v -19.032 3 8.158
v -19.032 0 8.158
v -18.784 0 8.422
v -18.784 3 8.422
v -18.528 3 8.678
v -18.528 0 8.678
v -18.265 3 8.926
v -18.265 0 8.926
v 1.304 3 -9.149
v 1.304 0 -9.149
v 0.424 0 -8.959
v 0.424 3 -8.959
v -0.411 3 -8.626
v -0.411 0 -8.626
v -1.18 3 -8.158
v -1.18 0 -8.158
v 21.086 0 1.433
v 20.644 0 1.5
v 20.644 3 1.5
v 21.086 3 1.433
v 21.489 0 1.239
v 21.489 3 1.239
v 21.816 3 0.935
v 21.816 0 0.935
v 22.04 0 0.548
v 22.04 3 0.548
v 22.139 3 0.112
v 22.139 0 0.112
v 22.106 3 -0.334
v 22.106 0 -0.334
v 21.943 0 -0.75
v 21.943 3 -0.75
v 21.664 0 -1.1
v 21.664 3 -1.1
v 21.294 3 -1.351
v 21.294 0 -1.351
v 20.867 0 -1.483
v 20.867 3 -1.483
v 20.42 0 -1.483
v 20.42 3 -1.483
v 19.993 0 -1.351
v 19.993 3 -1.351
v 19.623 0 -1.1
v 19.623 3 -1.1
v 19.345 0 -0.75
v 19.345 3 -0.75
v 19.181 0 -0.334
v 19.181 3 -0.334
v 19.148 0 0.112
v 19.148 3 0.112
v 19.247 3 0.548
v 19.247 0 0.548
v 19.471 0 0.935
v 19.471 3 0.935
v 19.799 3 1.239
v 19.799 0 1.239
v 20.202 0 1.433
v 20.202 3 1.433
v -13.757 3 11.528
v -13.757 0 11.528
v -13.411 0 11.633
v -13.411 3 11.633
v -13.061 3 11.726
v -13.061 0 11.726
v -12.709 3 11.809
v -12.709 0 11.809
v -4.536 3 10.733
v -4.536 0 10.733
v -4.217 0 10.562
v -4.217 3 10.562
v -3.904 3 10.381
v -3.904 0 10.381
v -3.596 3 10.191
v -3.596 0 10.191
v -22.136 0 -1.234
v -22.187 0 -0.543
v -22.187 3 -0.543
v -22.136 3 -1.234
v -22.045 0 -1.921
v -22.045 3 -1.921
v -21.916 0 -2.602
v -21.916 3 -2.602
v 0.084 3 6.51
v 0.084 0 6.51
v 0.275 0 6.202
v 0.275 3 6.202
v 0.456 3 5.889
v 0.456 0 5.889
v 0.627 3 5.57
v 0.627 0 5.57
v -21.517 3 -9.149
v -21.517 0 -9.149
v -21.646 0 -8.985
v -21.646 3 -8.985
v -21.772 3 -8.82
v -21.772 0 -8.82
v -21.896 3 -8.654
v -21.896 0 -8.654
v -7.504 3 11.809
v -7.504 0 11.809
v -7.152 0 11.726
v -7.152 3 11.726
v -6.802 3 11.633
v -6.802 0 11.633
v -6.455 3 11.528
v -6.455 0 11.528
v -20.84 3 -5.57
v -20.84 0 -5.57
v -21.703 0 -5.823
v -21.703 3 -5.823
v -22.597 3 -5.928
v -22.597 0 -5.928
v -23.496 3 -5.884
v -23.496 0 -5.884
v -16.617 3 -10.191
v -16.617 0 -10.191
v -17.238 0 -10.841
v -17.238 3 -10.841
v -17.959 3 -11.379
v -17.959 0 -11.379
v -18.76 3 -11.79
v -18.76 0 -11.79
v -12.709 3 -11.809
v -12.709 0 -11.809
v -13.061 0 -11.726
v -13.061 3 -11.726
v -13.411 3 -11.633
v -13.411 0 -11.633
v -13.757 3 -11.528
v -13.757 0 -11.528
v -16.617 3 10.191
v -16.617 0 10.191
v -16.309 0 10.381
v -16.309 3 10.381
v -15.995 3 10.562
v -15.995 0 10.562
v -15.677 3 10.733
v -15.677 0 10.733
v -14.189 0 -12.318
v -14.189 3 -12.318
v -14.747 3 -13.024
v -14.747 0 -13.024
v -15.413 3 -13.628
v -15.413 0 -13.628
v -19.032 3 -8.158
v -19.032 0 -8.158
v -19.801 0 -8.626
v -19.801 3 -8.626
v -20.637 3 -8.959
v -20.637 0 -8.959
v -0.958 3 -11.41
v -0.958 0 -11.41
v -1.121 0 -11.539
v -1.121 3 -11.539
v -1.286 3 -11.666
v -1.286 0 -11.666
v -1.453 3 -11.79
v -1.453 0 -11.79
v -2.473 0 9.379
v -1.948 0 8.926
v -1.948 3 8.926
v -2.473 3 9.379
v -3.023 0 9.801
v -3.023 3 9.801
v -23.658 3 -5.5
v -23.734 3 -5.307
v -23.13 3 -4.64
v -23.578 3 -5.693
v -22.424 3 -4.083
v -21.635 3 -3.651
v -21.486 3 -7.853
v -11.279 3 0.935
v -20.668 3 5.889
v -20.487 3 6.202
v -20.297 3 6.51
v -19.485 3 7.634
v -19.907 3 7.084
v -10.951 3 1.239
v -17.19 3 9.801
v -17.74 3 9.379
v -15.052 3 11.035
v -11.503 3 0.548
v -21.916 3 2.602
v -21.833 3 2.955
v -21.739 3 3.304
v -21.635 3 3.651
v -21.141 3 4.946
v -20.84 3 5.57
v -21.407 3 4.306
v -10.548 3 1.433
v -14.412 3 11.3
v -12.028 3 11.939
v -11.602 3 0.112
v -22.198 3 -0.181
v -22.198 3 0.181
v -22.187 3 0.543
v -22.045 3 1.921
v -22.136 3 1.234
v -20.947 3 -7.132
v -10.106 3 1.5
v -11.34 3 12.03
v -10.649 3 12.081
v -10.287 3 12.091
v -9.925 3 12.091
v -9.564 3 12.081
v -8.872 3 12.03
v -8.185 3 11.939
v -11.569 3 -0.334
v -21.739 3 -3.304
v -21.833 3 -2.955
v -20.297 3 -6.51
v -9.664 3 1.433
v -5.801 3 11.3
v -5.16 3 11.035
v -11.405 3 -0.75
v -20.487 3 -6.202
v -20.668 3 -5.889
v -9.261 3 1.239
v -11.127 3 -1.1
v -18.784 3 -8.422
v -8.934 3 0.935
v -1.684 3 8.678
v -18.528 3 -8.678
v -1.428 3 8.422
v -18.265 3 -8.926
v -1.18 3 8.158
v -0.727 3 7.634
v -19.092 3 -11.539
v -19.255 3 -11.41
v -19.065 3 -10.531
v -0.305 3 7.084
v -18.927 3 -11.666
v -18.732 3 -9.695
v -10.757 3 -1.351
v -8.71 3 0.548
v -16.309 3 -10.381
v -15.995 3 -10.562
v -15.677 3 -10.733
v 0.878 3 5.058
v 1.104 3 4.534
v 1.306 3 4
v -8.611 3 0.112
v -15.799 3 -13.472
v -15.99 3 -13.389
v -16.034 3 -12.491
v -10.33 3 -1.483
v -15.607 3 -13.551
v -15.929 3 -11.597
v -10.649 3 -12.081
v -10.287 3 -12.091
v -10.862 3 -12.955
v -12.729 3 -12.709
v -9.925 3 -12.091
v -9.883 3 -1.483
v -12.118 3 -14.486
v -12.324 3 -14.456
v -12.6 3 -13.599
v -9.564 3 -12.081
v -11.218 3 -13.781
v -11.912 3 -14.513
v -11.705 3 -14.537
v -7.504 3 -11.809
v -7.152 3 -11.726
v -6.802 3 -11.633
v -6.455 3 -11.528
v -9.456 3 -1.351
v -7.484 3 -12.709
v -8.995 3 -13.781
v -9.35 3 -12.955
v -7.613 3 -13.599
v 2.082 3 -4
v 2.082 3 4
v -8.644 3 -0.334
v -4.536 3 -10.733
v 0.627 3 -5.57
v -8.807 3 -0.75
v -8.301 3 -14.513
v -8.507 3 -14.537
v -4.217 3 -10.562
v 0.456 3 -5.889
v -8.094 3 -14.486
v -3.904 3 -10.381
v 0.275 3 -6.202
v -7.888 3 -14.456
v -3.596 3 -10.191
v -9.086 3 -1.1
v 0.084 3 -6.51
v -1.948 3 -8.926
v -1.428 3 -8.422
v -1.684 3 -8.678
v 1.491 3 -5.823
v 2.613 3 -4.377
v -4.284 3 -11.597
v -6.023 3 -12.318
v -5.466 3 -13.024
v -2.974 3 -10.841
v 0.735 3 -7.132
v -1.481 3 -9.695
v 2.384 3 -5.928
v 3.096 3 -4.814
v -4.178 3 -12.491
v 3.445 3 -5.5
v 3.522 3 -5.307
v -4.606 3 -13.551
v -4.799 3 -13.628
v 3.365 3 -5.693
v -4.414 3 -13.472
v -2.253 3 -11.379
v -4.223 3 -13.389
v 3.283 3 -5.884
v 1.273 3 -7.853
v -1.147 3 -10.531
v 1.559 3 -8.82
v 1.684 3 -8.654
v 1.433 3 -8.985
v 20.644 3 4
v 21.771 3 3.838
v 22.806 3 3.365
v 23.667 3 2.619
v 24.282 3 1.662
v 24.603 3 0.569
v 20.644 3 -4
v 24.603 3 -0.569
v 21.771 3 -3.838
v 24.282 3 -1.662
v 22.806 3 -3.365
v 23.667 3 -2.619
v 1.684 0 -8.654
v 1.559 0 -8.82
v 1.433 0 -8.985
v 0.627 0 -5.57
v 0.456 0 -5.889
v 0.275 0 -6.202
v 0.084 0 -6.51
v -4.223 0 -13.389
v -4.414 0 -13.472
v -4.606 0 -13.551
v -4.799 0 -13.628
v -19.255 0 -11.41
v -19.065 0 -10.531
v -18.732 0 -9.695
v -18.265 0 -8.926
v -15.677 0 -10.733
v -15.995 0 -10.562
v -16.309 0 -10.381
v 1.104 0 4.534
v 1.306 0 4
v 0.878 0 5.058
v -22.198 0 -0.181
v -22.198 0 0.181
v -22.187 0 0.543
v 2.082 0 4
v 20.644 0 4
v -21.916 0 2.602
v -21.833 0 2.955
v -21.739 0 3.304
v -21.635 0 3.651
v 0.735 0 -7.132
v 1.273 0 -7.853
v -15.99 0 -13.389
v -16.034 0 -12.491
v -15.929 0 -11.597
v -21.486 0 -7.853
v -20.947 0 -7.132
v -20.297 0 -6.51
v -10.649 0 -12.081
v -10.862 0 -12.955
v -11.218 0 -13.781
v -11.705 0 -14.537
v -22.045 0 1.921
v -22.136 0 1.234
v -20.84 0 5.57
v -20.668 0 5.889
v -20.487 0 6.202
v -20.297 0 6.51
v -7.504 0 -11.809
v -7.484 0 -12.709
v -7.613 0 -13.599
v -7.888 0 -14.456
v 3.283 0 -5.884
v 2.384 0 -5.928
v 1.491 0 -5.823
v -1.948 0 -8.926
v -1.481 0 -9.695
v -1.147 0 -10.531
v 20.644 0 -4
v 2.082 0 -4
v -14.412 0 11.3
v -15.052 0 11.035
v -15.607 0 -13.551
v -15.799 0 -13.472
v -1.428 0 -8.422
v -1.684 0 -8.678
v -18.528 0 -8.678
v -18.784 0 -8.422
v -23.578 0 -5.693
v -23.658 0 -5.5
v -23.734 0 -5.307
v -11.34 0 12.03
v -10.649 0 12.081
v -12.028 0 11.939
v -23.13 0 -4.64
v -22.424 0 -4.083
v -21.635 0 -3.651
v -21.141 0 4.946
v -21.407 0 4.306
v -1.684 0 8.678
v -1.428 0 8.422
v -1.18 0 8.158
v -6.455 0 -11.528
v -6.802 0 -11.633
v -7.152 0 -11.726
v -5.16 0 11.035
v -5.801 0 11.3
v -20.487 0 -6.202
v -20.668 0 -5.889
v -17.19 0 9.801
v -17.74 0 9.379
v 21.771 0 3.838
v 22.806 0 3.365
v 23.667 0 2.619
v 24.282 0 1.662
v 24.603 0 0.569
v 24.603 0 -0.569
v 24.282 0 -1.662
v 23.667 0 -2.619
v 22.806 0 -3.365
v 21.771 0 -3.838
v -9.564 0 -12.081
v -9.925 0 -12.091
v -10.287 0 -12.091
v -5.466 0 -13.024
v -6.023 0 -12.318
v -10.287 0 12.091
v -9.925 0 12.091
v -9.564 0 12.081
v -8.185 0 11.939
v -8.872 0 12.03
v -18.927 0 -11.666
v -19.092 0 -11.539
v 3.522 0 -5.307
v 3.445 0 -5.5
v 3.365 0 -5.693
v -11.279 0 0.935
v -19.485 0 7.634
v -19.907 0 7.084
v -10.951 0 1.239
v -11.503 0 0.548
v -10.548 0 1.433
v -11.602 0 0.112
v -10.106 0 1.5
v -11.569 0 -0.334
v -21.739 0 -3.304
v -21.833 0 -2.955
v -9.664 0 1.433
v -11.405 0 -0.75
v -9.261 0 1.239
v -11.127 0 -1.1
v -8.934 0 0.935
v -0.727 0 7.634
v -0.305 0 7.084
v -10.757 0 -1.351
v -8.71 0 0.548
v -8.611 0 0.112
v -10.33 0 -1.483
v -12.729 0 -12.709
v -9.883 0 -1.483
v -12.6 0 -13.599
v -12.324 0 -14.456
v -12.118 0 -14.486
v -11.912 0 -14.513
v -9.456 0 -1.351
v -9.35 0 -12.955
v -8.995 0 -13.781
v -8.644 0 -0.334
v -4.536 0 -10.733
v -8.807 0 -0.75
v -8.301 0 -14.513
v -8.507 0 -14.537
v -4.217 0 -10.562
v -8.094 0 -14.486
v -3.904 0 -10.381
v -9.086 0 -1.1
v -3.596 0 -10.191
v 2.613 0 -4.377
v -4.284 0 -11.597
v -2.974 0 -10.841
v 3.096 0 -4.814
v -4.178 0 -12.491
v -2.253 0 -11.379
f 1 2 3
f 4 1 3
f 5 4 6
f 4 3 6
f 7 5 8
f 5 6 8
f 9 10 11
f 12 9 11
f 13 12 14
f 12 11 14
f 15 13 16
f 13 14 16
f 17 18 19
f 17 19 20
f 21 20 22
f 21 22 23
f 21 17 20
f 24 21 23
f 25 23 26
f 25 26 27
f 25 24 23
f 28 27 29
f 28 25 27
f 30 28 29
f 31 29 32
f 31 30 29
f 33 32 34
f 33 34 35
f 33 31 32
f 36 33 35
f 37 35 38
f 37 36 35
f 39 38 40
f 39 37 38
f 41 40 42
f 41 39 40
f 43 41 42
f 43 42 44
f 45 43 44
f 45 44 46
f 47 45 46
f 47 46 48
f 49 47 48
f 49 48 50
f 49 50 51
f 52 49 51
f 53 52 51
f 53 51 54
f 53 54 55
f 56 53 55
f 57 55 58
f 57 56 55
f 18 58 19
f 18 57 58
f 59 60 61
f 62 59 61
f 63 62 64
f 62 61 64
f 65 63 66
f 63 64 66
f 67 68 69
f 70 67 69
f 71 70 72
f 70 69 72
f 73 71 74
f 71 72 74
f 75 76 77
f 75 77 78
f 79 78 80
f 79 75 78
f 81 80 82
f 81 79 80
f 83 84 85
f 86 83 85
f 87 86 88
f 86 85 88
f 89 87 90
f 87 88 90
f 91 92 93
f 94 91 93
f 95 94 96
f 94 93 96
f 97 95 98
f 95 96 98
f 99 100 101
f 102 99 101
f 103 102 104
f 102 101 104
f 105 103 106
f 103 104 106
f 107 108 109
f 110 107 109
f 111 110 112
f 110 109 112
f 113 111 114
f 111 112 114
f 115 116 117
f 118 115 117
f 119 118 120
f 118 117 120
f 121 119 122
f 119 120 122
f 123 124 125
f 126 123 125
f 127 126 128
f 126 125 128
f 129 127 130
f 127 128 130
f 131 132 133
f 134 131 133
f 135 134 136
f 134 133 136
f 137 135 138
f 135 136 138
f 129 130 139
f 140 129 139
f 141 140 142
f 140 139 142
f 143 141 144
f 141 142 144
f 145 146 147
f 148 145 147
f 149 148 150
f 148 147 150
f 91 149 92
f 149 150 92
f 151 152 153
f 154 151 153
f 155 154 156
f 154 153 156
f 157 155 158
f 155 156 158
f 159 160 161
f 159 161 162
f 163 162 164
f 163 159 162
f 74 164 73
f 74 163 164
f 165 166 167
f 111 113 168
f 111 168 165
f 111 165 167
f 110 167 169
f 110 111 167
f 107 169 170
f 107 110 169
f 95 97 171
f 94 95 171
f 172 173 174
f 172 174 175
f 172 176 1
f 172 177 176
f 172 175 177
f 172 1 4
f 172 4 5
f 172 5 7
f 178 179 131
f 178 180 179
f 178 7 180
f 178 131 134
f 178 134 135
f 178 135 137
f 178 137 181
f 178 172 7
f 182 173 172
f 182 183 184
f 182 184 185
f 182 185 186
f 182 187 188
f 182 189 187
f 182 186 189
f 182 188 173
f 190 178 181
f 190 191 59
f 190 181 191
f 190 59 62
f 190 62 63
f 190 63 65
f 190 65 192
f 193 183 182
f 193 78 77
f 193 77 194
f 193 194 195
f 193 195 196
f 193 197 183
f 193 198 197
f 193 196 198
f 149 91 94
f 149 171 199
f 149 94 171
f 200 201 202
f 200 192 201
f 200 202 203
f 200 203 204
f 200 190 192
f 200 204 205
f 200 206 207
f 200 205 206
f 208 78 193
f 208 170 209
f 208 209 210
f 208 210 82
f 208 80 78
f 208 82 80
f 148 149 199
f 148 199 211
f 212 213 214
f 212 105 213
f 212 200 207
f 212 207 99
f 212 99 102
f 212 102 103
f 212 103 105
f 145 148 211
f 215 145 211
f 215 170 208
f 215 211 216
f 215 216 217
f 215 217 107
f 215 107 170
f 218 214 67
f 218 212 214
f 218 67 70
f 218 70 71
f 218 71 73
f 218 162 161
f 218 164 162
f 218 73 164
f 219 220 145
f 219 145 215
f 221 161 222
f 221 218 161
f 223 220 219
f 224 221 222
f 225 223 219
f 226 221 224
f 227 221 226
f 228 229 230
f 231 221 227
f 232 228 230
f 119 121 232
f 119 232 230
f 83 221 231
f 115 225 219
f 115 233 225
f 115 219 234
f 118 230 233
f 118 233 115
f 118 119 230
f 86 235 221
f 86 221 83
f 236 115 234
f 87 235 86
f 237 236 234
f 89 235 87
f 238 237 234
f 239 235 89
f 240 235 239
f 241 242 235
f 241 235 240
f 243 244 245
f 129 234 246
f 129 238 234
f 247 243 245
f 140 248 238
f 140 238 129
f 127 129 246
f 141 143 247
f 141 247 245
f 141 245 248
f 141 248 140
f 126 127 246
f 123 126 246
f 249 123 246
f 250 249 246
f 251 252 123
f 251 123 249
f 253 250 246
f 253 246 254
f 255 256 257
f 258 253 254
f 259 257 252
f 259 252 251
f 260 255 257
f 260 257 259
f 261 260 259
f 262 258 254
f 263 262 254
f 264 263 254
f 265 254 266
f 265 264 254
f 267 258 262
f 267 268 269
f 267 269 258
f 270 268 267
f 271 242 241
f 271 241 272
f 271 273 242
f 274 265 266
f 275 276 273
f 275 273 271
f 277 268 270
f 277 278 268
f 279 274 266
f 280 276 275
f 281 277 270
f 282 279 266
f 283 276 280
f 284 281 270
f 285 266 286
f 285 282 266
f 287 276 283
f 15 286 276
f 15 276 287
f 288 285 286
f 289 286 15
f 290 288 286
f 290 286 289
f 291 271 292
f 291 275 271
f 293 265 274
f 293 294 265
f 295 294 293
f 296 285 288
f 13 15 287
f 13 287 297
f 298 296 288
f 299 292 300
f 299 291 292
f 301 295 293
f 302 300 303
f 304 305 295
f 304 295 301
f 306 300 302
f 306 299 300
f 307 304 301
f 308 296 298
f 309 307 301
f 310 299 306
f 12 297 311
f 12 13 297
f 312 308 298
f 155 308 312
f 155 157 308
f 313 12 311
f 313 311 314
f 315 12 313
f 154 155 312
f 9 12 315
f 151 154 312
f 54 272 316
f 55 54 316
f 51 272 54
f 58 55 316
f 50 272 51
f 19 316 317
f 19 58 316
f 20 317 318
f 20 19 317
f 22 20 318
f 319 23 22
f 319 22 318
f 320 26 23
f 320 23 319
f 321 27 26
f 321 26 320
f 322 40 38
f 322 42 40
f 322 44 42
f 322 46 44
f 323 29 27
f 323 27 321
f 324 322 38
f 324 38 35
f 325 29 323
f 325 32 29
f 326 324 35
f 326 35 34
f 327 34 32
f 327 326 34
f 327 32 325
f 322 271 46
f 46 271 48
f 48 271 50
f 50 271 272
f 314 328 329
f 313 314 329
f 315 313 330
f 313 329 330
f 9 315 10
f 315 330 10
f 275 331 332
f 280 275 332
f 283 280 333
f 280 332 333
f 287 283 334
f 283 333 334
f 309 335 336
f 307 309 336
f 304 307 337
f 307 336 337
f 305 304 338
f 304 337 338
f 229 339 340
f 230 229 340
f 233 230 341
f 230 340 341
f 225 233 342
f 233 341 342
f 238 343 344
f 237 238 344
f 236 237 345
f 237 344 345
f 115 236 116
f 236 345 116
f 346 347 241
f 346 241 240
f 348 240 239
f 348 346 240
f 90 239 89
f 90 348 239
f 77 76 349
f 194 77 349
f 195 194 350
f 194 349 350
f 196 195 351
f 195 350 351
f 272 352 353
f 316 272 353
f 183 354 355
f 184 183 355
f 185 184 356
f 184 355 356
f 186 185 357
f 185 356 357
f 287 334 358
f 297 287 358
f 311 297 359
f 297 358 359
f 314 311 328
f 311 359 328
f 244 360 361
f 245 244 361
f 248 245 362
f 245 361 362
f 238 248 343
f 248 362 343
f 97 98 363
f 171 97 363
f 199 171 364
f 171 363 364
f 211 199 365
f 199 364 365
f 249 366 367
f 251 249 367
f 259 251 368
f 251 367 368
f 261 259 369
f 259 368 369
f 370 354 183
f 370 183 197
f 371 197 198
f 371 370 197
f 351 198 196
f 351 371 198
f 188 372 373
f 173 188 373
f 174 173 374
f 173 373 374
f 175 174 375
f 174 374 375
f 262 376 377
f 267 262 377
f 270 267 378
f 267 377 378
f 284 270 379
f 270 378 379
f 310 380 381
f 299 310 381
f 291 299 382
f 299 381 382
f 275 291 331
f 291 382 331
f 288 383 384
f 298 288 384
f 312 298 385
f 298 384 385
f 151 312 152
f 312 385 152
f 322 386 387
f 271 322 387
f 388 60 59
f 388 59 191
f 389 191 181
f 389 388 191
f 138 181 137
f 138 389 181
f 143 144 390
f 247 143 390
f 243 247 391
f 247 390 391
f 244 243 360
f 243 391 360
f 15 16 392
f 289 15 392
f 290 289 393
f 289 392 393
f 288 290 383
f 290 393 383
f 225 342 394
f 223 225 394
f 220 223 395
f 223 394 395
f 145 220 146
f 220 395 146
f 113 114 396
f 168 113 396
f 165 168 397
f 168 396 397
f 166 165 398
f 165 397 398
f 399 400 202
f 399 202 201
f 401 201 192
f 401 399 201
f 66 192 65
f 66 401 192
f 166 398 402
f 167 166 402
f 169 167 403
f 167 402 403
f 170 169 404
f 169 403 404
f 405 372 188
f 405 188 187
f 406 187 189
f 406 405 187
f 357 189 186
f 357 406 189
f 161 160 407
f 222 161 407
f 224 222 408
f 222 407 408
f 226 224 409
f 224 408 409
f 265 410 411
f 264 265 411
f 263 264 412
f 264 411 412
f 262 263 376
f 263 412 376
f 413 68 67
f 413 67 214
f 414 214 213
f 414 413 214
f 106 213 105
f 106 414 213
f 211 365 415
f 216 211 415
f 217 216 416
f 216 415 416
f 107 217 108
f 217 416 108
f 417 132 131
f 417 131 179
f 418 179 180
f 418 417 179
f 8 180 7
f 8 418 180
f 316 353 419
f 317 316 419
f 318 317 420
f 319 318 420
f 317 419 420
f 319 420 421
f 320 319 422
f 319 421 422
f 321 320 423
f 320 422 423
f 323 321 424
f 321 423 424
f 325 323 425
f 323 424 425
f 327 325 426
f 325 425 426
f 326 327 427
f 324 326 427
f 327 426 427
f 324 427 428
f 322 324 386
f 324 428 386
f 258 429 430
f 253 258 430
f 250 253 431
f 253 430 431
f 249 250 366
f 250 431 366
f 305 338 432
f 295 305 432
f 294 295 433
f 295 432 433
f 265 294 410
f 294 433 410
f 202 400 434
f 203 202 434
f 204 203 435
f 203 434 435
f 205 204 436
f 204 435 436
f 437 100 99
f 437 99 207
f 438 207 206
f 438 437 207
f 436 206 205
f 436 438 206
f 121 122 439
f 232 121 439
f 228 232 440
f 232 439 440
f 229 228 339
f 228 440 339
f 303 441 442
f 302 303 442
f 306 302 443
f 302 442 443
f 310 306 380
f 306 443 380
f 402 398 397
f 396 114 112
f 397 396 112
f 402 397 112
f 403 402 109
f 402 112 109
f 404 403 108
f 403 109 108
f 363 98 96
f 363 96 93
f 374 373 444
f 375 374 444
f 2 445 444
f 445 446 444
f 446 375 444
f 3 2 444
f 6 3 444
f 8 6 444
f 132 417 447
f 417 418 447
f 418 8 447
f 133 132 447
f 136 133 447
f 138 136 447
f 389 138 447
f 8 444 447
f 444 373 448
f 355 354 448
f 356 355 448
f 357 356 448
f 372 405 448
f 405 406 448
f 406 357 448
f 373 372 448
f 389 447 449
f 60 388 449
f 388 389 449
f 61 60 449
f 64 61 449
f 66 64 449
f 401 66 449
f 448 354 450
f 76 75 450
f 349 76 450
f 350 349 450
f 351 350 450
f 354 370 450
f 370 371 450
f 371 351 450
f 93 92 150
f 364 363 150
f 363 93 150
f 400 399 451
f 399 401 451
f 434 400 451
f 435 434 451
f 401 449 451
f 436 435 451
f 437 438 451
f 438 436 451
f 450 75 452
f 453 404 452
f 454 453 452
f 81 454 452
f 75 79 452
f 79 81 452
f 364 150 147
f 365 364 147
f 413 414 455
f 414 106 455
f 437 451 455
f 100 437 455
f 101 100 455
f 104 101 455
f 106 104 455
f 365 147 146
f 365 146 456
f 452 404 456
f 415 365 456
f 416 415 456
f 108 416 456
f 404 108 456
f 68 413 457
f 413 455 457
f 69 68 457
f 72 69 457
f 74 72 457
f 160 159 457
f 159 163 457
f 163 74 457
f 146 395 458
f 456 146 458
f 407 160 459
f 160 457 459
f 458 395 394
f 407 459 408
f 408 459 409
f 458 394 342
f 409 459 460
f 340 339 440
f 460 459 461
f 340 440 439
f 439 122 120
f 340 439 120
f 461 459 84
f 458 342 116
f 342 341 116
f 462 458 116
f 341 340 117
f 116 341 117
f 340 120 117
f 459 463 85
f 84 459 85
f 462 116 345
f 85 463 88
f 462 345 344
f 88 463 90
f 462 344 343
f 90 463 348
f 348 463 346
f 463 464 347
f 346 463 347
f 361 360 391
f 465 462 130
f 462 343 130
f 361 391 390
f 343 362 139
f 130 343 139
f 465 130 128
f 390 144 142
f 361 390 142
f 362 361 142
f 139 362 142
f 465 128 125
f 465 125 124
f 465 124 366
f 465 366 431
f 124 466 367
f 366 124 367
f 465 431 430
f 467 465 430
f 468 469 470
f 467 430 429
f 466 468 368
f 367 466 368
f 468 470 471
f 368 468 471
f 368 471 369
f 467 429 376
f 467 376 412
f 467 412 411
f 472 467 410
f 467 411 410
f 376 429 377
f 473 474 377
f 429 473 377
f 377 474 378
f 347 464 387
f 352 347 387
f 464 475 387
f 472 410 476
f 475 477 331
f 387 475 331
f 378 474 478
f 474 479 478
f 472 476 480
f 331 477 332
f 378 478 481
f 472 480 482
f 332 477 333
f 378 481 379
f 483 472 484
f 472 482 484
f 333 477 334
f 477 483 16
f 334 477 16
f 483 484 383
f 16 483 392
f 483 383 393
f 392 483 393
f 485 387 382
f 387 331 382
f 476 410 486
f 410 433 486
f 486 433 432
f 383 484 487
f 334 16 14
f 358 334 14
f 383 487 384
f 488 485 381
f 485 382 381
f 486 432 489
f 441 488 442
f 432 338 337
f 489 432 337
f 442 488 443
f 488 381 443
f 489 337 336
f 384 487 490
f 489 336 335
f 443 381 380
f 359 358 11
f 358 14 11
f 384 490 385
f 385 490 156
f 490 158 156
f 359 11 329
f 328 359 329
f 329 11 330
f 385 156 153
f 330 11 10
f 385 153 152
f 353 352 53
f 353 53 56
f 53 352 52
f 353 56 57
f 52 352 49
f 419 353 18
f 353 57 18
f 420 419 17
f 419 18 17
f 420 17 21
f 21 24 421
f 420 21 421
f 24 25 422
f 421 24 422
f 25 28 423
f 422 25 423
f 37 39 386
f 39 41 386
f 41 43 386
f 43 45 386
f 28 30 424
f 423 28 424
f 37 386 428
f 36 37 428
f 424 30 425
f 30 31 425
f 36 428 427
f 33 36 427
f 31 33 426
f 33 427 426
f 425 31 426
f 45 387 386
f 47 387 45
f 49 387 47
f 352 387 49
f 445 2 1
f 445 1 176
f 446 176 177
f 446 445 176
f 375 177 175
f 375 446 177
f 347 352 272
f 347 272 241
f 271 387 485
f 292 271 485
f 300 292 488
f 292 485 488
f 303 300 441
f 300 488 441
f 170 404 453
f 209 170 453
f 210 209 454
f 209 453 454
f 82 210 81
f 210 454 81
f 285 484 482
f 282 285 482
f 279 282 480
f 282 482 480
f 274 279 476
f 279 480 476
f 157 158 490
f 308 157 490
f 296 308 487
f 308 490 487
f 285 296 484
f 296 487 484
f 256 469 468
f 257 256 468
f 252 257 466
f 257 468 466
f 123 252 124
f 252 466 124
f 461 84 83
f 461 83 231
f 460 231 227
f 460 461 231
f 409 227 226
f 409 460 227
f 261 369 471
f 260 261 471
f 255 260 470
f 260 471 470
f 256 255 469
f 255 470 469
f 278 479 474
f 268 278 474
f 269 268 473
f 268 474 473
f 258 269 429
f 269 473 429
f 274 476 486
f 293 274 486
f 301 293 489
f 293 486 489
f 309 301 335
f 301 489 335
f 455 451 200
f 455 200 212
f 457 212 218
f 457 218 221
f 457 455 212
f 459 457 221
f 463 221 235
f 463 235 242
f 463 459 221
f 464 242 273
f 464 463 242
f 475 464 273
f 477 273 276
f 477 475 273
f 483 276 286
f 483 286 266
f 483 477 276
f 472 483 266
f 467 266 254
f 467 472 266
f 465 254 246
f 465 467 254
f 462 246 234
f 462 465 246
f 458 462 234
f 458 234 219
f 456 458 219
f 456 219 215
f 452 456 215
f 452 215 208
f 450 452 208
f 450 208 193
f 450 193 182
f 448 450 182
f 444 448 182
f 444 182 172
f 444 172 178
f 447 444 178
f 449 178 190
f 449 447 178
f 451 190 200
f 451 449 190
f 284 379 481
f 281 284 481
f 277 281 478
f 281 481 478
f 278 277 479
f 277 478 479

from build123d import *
from build123d.topology import SkipClean

# Parameters (mm, degrees)
SKETCH1_R           = 1.5
BOSS_EXTRUDE1_DEPTH = 3
CUT_EXTRUDE1_START  = -10
CUT_EXTRUDE1_DEPTH  = 10


with BuildPart() as part:
    # Sketch1 → Boss-Extrude1 (new body)
    with BuildSketch(Plane(origin=(0, 0, 0), x_dir=(1, 0, 0), z_dir=(0, 1, 0))):
        with BuildLine():
            Line((20.643657446, 4), (2.081641936, 4))
            ThreePointArc((2.081641936, 4), (2.861028333, 4.588201733), (3.521749436, 5.30713988))
            ThreePointArc((3.521749436, 5.30713988), (3.405395609, 5.596745198), (3.282888305, 5.883801663))
            ThreePointArc((3.282888305, 5.883801663), (1.93527598, 5.894040025), (0.627094961, 5.57027124))
            ThreePointArc((0.627094961, 5.57027124), (0.366286148, 6.046375), (0.084372603, 6.510293938))
            ThreePointArc((0.084372603, 6.510293938), (1.018855105, 7.48132754), (1.683794586, 8.65351323))
            ThreePointArc((1.683794586, 8.65351323), (1.496450048, 8.903135899), (1.303821399, 9.148703928))
            ThreePointArc((1.303821399, 9.148703928), (-0.000522033, 8.809805691), (-1.180330337, 8.158486898))
            ThreePointArc((-1.180330337, 8.158486898), (-1.555477026, 8.550865528), (-1.947855656, 8.926012217))
            ThreePointArc((-1.947855656, 8.926012217), (-1.296536862, 10.105820521), (-0.957638625, 11.410163953))
            ThreePointArc((-0.957638625, 11.410163953), (-1.203206655, 11.602792602), (-1.452829324, 11.79013714))
            ThreePointArc((-1.452829324, 11.79013714), (-2.625015014, 11.125197659), (-3.596048616, 10.190715157))
            ThreePointArc((-3.596048616, 10.190715157), (-4.059967554, 10.472628702), (-4.536071314, 10.733437515))
            ThreePointArc((-4.536071314, 10.733437515), (-4.212302529, 12.041618533), (-4.222540891, 13.389230859))
            ThreePointArc((-4.222540891, 13.389230859), (-4.509597355, 13.511738163), (-4.799202674, 13.62809199))
            ThreePointArc((-4.799202674, 13.62809199), (-5.759348103, 12.682425791), (-6.455432668, 11.528463019))
            ThreePointArc((-6.455432668, 11.528463019), (-6.976508546, 11.680699536), (-7.503891752, 11.809396783))
            ThreePointArc((-7.503891752, 11.809396783), (-7.529737283, 13.156800143), (-7.888414517, 14.455843809))
            ThreePointArc((-7.888414517, 14.455843809), (-8.197396993, 14.499881098), (-8.507248835, 14.537314892))
            ThreePointArc((-8.507248835, 14.537314892), (-9.18992168, 13.375367565), (-9.563620196, 12.080565177))
            ThreePointArc((-9.563620196, 12.080565177), (-10.106342554, 12.09275), (-10.649064912, 12.080565177))
            ThreePointArc((-10.649064912, 12.080565177), (-11.022763428, 13.375367565), (-11.705436272, 14.537314892))
            ThreePointArc((-11.705436272, 14.537314892), (-12.015288115, 14.499881098), (-12.324270591, 14.455843809))
            ThreePointArc((-12.324270591, 14.455843809), (-12.682947825, 13.156800143), (-12.708793355, 11.809396783))
            ThreePointArc((-12.708793355, 11.809396783), (-13.236176561, 11.680699536), (-13.757252439, 11.528463019))
            ThreePointArc((-13.757252439, 11.528463019), (-14.453337005, 12.682425791), (-15.413482434, 13.62809199))
            ThreePointArc((-15.413482434, 13.62809199), (-15.703087752, 13.511738163), (-15.990144217, 13.389230859))
            ThreePointArc((-15.990144217, 13.389230859), (-16.000382579, 12.041618533), (-15.676613793, 10.733437515))
            ThreePointArc((-15.676613793, 10.733437515), (-16.152717554, 10.472628702), (-16.616636492, 10.190715157))
            ThreePointArc((-16.616636492, 10.190715157), (-17.587670094, 11.125197659), (-18.759855783, 11.79013714))
            ThreePointArc((-18.759855783, 11.79013714), (-19.009478453, 11.602792602), (-19.255046482, 11.410163953))
            ThreePointArc((-19.255046482, 11.410163953), (-18.916148245, 10.105820521), (-18.264829452, 8.926012217))
            ThreePointArc((-18.264829452, 8.926012217), (-18.657208082, 8.550865528), (-19.032354771, 8.158486898))
            ThreePointArc((-19.032354771, 8.158486898), (-20.212163074, 8.809805691), (-21.516506507, 9.148703928))
            ThreePointArc((-21.516506507, 9.148703928), (-21.709135156, 8.903135899), (-21.896479694, 8.65351323))
            ThreePointArc((-21.896479694, 8.65351323), (-21.231540213, 7.48132754), (-20.297057711, 6.510293938))
            ThreePointArc((-20.297057711, 6.510293938), (-20.578971255, 6.046375), (-20.839780068, 5.57027124))
            ThreePointArc((-20.839780068, 5.57027124), (-22.147961087, 5.894040025), (-23.495573413, 5.883801663))
            ThreePointArc((-23.495573413, 5.883801663), (-23.618080717, 5.596745198), (-23.734434544, 5.30713988))
            ThreePointArc((-23.734434544, 5.30713988), (-22.788768345, 4.346994451), (-21.634805572, 3.650909885))
            ThreePointArc((-21.634805572, 3.650909885), (-21.78704209, 3.129834008), (-21.915739337, 2.602450802))
            ThreePointArc((-21.915739337, 2.602450802), (-23.263142697, 2.576605271), (-24.562186363, 2.217928037))
            ThreePointArc((-24.562186363, 2.217928037), (-24.606223651, 1.908945561), (-24.643657446, 1.599093719))
            ThreePointArc((-24.643657446, 1.599093719), (-23.481710119, 0.916420874), (-22.186907731, 0.542722358))
            ThreePointArc((-22.186907731, 0.542722358), (-22.199092554, 0), (-22.186907731, -0.542722358))
            ThreePointArc((-22.186907731, -0.542722358), (-23.481710119, -0.916420874), (-24.643657446, -1.599093719))
            ThreePointArc((-24.643657446, -1.599093719), (-24.606223651, -1.908945561), (-24.562186363, -2.217928037))
            ThreePointArc((-24.562186363, -2.217928037), (-23.263142697, -2.576605271), (-21.915739337, -2.602450802))
            ThreePointArc((-21.915739337, -2.602450802), (-21.78704209, -3.129834008), (-21.634805572, -3.650909885))
            ThreePointArc((-21.634805572, -3.650909885), (-22.788768345, -4.346994451), (-23.734434544, -5.30713988))
            ThreePointArc((-23.734434544, -5.30713988), (-23.618080717, -5.596745198), (-23.495573413, -5.883801663))
            ThreePointArc((-23.495573413, -5.883801663), (-22.147961087, -5.894040025), (-20.839780068, -5.57027124))
            ThreePointArc((-20.839780068, -5.57027124), (-20.578971255, -6.046375), (-20.297057711, -6.510293938))
            ThreePointArc((-20.297057711, -6.510293938), (-21.231540213, -7.48132754), (-21.896479694, -8.65351323))
            ThreePointArc((-21.896479694, -8.65351323), (-21.709135156, -8.903135899), (-21.516506507, -9.148703928))
            ThreePointArc((-21.516506507, -9.148703928), (-20.212163074, -8.809805691), (-19.032354771, -8.158486898))
            ThreePointArc((-19.032354771, -8.158486898), (-18.657208082, -8.550865528), (-18.264829452, -8.926012217))
            ThreePointArc((-18.264829452, -8.926012217), (-18.916148245, -10.105820521), (-19.255046482, -11.410163953))
            ThreePointArc((-19.255046482, -11.410163953), (-19.009478453, -11.602792602), (-18.759855783, -11.79013714))
            ThreePointArc((-18.759855783, -11.79013714), (-17.587670094, -11.125197659), (-16.616636492, -10.190715157))
            ThreePointArc((-16.616636492, -10.190715157), (-16.152717554, -10.472628702), (-15.676613793, -10.733437515))
            ThreePointArc((-15.676613793, -10.733437515), (-16.000382579, -12.041618533), (-15.990144217, -13.389230859))
            ThreePointArc((-15.990144217, -13.389230859), (-15.703087752, -13.511738163), (-15.413482434, -13.62809199))
            ThreePointArc((-15.413482434, -13.62809199), (-14.453337005, -12.682425791), (-13.757252439, -11.528463019))
            ThreePointArc((-13.757252439, -11.528463019), (-13.236176561, -11.680699536), (-12.708793355, -11.809396783))
            ThreePointArc((-12.708793355, -11.809396783), (-12.682947825, -13.156800143), (-12.324270591, -14.455843809))
            ThreePointArc((-12.324270591, -14.455843809), (-12.015288115, -14.499881098), (-11.705436272, -14.537314892))
            ThreePointArc((-11.705436272, -14.537314892), (-11.022763428, -13.375367565), (-10.649064912, -12.080565177))
            ThreePointArc((-10.649064912, -12.080565177), (-10.106342554, -12.09275), (-9.563620196, -12.080565177))
            ThreePointArc((-9.563620196, -12.080565177), (-9.18992168, -13.375367565), (-8.507248835, -14.537314892))
            ThreePointArc((-8.507248835, -14.537314892), (-8.197396993, -14.499881098), (-7.888414517, -14.455843809))
            ThreePointArc((-7.888414517, -14.455843809), (-7.529737283, -13.156800143), (-7.503891752, -11.809396783))
            ThreePointArc((-7.503891752, -11.809396783), (-6.976508546, -11.680699536), (-6.455432668, -11.528463019))
            ThreePointArc((-6.455432668, -11.528463019), (-5.759348103, -12.682425791), (-4.799202674, -13.62809199))
            ThreePointArc((-4.799202674, -13.62809199), (-4.509597355, -13.511738163), (-4.222540891, -13.389230859))
            ThreePointArc((-4.222540891, -13.389230859), (-4.212302529, -12.041618533), (-4.536071314, -10.733437515))
            ThreePointArc((-4.536071314, -10.733437515), (-4.059967554, -10.472628702), (-3.596048616, -10.190715157))
            ThreePointArc((-3.596048616, -10.190715157), (-2.625015014, -11.125197659), (-1.452829324, -11.79013714))
            ThreePointArc((-1.452829324, -11.79013714), (-1.203206655, -11.602792602), (-0.957638625, -11.410163953))
            ThreePointArc((-0.957638625, -11.410163953), (-1.296536862, -10.105820521), (-1.947855656, -8.926012217))
            ThreePointArc((-1.947855656, -8.926012217), (-1.555477026, -8.550865528), (-1.180330337, -8.158486898))
            ThreePointArc((-1.180330337, -8.158486898), (-0.000522033, -8.809805691), (1.303821399, -9.148703928))
            ThreePointArc((1.303821399, -9.148703928), (1.496450048, -8.903135899), (1.683794586, -8.65351323))
            ThreePointArc((1.683794586, -8.65351323), (1.018855105, -7.48132754), (0.084372603, -6.510293938))
            ThreePointArc((0.084372603, -6.510293938), (0.366286148, -6.046375), (0.627094961, -5.57027124))
            ThreePointArc((0.627094961, -5.57027124), (1.93527598, -5.894040025), (3.282888305, -5.883801663))
            ThreePointArc((3.282888305, -5.883801663), (3.405395609, -5.596745198), (3.521749436, -5.30713988))
            ThreePointArc((3.521749436, -5.30713988), (2.861028333, -4.588201733), (2.081641936, -4))
            Line((2.081641936, -4), (20.643657446, -4))
            ThreePointArc((20.643657446, -4), (24.643657446, 0), (20.643657446, 4))
        make_face()
        with Locations(Location((-10.106342554, 0, 0), (0, 0, 270))):
            Circle(SKETCH1_R, mode=Mode.SUBTRACT)
        with Locations(Location((20.643657446, 0, 0), (0, 0, 270))):
            Circle(SKETCH1_R, mode=Mode.SUBTRACT)
    extrude(amount=BOSS_EXTRUDE1_DEPTH)

    # Sketch2 → Cut-Extrude1 (cut)
    with SkipClean():  # the faces are left unmerged after this step: merging them gives an invalid solid
        with BuildSketch(Plane(origin=(0, 3, 0), x_dir=(1, 0, 0), z_dir=(0, 1, 0)).offset(CUT_EXTRUDE1_START)):
            with BuildLine():
                ThreePointArc((-24.562186363, -2.217928037), (-23.263142697, -2.576605271), (-21.915739337, -2.602450802))
                ThreePointArc((-21.915739337, -2.602450802), (-22.095637401, -1.578420611), (-22.186907731, -0.542722358))
                ThreePointArc((-22.186907731, -0.542722358), (-23.481710119, -0.916420874), (-24.643657446, -1.599093719))
                ThreePointArc((-24.643657446, -1.599093719), (-24.606223651, -1.908945561), (-24.562186363, -2.217928037))
            make_face()
            with BuildLine():
                ThreePointArc((-23.495573413, -5.883801663), (-22.147961087, -5.894040025), (-20.839780068, -5.57027124))
                ThreePointArc((-20.839780068, -5.57027124), (-21.278586771, -4.627695077), (-21.634805572, -3.650909885))
                ThreePointArc((-21.634805572, -3.650909885), (-22.788768345, -4.346994451), (-23.734434544, -5.30713988))
                ThreePointArc((-23.734434544, -5.30713988), (-23.618080717, -5.596745198), (-23.495573413, -5.883801663))
            make_face()
            with BuildLine():
                ThreePointArc((-21.516506507, -9.148703928), (-20.212163074, -8.809805691), (-19.032354771, -8.158486898))
                ThreePointArc((-19.032354771, -8.158486898), (-19.70016616, -7.361599771), (-20.297057711, -6.510293938))
                ThreePointArc((-20.297057711, -6.510293938), (-21.231540213, -7.48132754), (-21.896479694, -8.65351323))
                ThreePointArc((-21.896479694, -8.65351323), (-21.709135156, -8.903135899), (-21.516506507, -9.148703928))
            make_face()
            with BuildLine():
                ThreePointArc((-18.759855783, -11.79013714), (-17.587670094, -11.125197659), (-16.616636492, -10.190715157))
                ThreePointArc((-16.616636492, -10.190715157), (-17.467942324, -9.593823606), (-18.264829452, -8.926012217))
                ThreePointArc((-18.264829452, -8.926012217), (-18.916148245, -10.105820521), (-19.255046482, -11.410163953))
                ThreePointArc((-19.255046482, -11.410163953), (-19.009478453, -11.602792602), (-18.759855783, -11.79013714))
            make_face()
            with BuildLine():
                ThreePointArc((-15.413482434, -13.62809199), (-14.453337005, -12.682425791), (-13.757252439, -11.528463019))
                ThreePointArc((-13.757252439, -11.528463019), (-14.734037631, -11.172244217), (-15.676613793, -10.733437515))
                ThreePointArc((-15.676613793, -10.733437515), (-16.000382579, -12.041618533), (-15.990144217, -13.389230859))
                ThreePointArc((-15.990144217, -13.389230859), (-15.703087752, -13.511738163), (-15.413482434, -13.62809199))
            make_face()
            with BuildLine():
                ThreePointArc((-11.705436272, -14.537314892), (-11.022763428, -13.375367565), (-10.649064912, -12.080565177))
                ThreePointArc((-10.649064912, -12.080565177), (-11.684763165, -11.989294847), (-12.708793355, -11.809396783))
                ThreePointArc((-12.708793355, -11.809396783), (-12.682947825, -13.156800143), (-12.324270591, -14.455843809))
                ThreePointArc((-12.324270591, -14.455843809), (-12.015288115, -14.499881098), (-11.705436272, -14.537314892))
            make_face()
            with BuildLine():
                ThreePointArc((-7.888414517, -14.455843809), (-7.529737283, -13.156800143), (-7.503891752, -11.809396783))
                ThreePointArc((-7.503891752, -11.809396783), (-8.527921943, -11.989294847), (-9.563620196, -12.080565177))
                ThreePointArc((-9.563620196, -12.080565177), (-9.18992168, -13.375367565), (-8.507248835, -14.537314892))
                ThreePointArc((-8.507248835, -14.537314892), (-8.197396993, -14.499881098), (-7.888414517, -14.455843809))
            make_face()
            with BuildLine():
                ThreePointArc((-4.222540891, -13.389230859), (-4.212302529, -12.041618533), (-4.536071314, -10.733437515))
                ThreePointArc((-4.536071314, -10.733437515), (-5.478647477, -11.172244217), (-6.455432668, -11.528463019))
                ThreePointArc((-6.455432668, -11.528463019), (-5.759348103, -12.682425791), (-4.799202674, -13.62809199))
                ThreePointArc((-4.799202674, -13.62809199), (-4.509597355, -13.511738163), (-4.222540891, -13.389230859))
            make_face()
            with BuildLine():
                ThreePointArc((-0.957638625, -11.410163953), (-1.296536862, -10.105820521), (-1.947855656, -8.926012217))
                ThreePointArc((-1.947855656, -8.926012217), (-2.744742783, -9.593823606), (-3.596048616, -10.190715157))
                ThreePointArc((-3.596048616, -10.190715157), (-2.625015014, -11.125197659), (-1.452829324, -11.79013714))
                ThreePointArc((-1.452829324, -11.79013714), (-1.203206655, -11.602792602), (-0.957638625, -11.410163953))
            make_face()
            with BuildLine():
                ThreePointArc((1.683794586, -8.65351323), (1.018855105, -7.48132754), (0.084372603, -6.510293938))
                ThreePointArc((0.084372603, -6.510293938), (-0.512518948, -7.361599771), (-1.180330337, -8.158486898))
                ThreePointArc((-1.180330337, -8.158486898), (-0.000522033, -8.809805691), (1.303821399, -9.148703928))
                ThreePointArc((1.303821399, -9.148703928), (1.496450048, -8.903135899), (1.683794586, -8.65351323))
            make_face()
            with BuildLine():
                ThreePointArc((3.521749436, -5.30713988), (2.861028333, -4.588201733), (2.081641936, -4))
                Line((2.081641936, -4), (1.305695063, -4))
                ThreePointArc((1.305695063, -4), (0.994195953, -4.797149927), (0.627094961, -5.57027124))
                ThreePointArc((0.627094961, -5.57027124), (1.93527598, -5.894040025), (3.282888305, -5.883801663))
                ThreePointArc((3.282888305, -5.883801663), (3.405395609, -5.596745198), (3.521749436, -5.30713988))
            make_face()
            with BuildLine():
                ThreePointArc((-22.186907731, 0.542722358), (-22.095637401, 1.578420611), (-21.915739337, 2.602450802))
                ThreePointArc((-21.915739337, 2.602450802), (-23.263142697, 2.576605271), (-24.562186363, 2.217928037))
                ThreePointArc((-24.562186363, 2.217928037), (-24.606223651, 1.908945561), (-24.643657446, 1.599093719))
                ThreePointArc((-24.643657446, 1.599093719), (-23.481710119, 0.916420874), (-22.186907731, 0.542722358))
            make_face()
        extrude(amount=CUT_EXTRUDE1_DEPTH, mode=Mode.SUBTRACT)


solid = part.part
